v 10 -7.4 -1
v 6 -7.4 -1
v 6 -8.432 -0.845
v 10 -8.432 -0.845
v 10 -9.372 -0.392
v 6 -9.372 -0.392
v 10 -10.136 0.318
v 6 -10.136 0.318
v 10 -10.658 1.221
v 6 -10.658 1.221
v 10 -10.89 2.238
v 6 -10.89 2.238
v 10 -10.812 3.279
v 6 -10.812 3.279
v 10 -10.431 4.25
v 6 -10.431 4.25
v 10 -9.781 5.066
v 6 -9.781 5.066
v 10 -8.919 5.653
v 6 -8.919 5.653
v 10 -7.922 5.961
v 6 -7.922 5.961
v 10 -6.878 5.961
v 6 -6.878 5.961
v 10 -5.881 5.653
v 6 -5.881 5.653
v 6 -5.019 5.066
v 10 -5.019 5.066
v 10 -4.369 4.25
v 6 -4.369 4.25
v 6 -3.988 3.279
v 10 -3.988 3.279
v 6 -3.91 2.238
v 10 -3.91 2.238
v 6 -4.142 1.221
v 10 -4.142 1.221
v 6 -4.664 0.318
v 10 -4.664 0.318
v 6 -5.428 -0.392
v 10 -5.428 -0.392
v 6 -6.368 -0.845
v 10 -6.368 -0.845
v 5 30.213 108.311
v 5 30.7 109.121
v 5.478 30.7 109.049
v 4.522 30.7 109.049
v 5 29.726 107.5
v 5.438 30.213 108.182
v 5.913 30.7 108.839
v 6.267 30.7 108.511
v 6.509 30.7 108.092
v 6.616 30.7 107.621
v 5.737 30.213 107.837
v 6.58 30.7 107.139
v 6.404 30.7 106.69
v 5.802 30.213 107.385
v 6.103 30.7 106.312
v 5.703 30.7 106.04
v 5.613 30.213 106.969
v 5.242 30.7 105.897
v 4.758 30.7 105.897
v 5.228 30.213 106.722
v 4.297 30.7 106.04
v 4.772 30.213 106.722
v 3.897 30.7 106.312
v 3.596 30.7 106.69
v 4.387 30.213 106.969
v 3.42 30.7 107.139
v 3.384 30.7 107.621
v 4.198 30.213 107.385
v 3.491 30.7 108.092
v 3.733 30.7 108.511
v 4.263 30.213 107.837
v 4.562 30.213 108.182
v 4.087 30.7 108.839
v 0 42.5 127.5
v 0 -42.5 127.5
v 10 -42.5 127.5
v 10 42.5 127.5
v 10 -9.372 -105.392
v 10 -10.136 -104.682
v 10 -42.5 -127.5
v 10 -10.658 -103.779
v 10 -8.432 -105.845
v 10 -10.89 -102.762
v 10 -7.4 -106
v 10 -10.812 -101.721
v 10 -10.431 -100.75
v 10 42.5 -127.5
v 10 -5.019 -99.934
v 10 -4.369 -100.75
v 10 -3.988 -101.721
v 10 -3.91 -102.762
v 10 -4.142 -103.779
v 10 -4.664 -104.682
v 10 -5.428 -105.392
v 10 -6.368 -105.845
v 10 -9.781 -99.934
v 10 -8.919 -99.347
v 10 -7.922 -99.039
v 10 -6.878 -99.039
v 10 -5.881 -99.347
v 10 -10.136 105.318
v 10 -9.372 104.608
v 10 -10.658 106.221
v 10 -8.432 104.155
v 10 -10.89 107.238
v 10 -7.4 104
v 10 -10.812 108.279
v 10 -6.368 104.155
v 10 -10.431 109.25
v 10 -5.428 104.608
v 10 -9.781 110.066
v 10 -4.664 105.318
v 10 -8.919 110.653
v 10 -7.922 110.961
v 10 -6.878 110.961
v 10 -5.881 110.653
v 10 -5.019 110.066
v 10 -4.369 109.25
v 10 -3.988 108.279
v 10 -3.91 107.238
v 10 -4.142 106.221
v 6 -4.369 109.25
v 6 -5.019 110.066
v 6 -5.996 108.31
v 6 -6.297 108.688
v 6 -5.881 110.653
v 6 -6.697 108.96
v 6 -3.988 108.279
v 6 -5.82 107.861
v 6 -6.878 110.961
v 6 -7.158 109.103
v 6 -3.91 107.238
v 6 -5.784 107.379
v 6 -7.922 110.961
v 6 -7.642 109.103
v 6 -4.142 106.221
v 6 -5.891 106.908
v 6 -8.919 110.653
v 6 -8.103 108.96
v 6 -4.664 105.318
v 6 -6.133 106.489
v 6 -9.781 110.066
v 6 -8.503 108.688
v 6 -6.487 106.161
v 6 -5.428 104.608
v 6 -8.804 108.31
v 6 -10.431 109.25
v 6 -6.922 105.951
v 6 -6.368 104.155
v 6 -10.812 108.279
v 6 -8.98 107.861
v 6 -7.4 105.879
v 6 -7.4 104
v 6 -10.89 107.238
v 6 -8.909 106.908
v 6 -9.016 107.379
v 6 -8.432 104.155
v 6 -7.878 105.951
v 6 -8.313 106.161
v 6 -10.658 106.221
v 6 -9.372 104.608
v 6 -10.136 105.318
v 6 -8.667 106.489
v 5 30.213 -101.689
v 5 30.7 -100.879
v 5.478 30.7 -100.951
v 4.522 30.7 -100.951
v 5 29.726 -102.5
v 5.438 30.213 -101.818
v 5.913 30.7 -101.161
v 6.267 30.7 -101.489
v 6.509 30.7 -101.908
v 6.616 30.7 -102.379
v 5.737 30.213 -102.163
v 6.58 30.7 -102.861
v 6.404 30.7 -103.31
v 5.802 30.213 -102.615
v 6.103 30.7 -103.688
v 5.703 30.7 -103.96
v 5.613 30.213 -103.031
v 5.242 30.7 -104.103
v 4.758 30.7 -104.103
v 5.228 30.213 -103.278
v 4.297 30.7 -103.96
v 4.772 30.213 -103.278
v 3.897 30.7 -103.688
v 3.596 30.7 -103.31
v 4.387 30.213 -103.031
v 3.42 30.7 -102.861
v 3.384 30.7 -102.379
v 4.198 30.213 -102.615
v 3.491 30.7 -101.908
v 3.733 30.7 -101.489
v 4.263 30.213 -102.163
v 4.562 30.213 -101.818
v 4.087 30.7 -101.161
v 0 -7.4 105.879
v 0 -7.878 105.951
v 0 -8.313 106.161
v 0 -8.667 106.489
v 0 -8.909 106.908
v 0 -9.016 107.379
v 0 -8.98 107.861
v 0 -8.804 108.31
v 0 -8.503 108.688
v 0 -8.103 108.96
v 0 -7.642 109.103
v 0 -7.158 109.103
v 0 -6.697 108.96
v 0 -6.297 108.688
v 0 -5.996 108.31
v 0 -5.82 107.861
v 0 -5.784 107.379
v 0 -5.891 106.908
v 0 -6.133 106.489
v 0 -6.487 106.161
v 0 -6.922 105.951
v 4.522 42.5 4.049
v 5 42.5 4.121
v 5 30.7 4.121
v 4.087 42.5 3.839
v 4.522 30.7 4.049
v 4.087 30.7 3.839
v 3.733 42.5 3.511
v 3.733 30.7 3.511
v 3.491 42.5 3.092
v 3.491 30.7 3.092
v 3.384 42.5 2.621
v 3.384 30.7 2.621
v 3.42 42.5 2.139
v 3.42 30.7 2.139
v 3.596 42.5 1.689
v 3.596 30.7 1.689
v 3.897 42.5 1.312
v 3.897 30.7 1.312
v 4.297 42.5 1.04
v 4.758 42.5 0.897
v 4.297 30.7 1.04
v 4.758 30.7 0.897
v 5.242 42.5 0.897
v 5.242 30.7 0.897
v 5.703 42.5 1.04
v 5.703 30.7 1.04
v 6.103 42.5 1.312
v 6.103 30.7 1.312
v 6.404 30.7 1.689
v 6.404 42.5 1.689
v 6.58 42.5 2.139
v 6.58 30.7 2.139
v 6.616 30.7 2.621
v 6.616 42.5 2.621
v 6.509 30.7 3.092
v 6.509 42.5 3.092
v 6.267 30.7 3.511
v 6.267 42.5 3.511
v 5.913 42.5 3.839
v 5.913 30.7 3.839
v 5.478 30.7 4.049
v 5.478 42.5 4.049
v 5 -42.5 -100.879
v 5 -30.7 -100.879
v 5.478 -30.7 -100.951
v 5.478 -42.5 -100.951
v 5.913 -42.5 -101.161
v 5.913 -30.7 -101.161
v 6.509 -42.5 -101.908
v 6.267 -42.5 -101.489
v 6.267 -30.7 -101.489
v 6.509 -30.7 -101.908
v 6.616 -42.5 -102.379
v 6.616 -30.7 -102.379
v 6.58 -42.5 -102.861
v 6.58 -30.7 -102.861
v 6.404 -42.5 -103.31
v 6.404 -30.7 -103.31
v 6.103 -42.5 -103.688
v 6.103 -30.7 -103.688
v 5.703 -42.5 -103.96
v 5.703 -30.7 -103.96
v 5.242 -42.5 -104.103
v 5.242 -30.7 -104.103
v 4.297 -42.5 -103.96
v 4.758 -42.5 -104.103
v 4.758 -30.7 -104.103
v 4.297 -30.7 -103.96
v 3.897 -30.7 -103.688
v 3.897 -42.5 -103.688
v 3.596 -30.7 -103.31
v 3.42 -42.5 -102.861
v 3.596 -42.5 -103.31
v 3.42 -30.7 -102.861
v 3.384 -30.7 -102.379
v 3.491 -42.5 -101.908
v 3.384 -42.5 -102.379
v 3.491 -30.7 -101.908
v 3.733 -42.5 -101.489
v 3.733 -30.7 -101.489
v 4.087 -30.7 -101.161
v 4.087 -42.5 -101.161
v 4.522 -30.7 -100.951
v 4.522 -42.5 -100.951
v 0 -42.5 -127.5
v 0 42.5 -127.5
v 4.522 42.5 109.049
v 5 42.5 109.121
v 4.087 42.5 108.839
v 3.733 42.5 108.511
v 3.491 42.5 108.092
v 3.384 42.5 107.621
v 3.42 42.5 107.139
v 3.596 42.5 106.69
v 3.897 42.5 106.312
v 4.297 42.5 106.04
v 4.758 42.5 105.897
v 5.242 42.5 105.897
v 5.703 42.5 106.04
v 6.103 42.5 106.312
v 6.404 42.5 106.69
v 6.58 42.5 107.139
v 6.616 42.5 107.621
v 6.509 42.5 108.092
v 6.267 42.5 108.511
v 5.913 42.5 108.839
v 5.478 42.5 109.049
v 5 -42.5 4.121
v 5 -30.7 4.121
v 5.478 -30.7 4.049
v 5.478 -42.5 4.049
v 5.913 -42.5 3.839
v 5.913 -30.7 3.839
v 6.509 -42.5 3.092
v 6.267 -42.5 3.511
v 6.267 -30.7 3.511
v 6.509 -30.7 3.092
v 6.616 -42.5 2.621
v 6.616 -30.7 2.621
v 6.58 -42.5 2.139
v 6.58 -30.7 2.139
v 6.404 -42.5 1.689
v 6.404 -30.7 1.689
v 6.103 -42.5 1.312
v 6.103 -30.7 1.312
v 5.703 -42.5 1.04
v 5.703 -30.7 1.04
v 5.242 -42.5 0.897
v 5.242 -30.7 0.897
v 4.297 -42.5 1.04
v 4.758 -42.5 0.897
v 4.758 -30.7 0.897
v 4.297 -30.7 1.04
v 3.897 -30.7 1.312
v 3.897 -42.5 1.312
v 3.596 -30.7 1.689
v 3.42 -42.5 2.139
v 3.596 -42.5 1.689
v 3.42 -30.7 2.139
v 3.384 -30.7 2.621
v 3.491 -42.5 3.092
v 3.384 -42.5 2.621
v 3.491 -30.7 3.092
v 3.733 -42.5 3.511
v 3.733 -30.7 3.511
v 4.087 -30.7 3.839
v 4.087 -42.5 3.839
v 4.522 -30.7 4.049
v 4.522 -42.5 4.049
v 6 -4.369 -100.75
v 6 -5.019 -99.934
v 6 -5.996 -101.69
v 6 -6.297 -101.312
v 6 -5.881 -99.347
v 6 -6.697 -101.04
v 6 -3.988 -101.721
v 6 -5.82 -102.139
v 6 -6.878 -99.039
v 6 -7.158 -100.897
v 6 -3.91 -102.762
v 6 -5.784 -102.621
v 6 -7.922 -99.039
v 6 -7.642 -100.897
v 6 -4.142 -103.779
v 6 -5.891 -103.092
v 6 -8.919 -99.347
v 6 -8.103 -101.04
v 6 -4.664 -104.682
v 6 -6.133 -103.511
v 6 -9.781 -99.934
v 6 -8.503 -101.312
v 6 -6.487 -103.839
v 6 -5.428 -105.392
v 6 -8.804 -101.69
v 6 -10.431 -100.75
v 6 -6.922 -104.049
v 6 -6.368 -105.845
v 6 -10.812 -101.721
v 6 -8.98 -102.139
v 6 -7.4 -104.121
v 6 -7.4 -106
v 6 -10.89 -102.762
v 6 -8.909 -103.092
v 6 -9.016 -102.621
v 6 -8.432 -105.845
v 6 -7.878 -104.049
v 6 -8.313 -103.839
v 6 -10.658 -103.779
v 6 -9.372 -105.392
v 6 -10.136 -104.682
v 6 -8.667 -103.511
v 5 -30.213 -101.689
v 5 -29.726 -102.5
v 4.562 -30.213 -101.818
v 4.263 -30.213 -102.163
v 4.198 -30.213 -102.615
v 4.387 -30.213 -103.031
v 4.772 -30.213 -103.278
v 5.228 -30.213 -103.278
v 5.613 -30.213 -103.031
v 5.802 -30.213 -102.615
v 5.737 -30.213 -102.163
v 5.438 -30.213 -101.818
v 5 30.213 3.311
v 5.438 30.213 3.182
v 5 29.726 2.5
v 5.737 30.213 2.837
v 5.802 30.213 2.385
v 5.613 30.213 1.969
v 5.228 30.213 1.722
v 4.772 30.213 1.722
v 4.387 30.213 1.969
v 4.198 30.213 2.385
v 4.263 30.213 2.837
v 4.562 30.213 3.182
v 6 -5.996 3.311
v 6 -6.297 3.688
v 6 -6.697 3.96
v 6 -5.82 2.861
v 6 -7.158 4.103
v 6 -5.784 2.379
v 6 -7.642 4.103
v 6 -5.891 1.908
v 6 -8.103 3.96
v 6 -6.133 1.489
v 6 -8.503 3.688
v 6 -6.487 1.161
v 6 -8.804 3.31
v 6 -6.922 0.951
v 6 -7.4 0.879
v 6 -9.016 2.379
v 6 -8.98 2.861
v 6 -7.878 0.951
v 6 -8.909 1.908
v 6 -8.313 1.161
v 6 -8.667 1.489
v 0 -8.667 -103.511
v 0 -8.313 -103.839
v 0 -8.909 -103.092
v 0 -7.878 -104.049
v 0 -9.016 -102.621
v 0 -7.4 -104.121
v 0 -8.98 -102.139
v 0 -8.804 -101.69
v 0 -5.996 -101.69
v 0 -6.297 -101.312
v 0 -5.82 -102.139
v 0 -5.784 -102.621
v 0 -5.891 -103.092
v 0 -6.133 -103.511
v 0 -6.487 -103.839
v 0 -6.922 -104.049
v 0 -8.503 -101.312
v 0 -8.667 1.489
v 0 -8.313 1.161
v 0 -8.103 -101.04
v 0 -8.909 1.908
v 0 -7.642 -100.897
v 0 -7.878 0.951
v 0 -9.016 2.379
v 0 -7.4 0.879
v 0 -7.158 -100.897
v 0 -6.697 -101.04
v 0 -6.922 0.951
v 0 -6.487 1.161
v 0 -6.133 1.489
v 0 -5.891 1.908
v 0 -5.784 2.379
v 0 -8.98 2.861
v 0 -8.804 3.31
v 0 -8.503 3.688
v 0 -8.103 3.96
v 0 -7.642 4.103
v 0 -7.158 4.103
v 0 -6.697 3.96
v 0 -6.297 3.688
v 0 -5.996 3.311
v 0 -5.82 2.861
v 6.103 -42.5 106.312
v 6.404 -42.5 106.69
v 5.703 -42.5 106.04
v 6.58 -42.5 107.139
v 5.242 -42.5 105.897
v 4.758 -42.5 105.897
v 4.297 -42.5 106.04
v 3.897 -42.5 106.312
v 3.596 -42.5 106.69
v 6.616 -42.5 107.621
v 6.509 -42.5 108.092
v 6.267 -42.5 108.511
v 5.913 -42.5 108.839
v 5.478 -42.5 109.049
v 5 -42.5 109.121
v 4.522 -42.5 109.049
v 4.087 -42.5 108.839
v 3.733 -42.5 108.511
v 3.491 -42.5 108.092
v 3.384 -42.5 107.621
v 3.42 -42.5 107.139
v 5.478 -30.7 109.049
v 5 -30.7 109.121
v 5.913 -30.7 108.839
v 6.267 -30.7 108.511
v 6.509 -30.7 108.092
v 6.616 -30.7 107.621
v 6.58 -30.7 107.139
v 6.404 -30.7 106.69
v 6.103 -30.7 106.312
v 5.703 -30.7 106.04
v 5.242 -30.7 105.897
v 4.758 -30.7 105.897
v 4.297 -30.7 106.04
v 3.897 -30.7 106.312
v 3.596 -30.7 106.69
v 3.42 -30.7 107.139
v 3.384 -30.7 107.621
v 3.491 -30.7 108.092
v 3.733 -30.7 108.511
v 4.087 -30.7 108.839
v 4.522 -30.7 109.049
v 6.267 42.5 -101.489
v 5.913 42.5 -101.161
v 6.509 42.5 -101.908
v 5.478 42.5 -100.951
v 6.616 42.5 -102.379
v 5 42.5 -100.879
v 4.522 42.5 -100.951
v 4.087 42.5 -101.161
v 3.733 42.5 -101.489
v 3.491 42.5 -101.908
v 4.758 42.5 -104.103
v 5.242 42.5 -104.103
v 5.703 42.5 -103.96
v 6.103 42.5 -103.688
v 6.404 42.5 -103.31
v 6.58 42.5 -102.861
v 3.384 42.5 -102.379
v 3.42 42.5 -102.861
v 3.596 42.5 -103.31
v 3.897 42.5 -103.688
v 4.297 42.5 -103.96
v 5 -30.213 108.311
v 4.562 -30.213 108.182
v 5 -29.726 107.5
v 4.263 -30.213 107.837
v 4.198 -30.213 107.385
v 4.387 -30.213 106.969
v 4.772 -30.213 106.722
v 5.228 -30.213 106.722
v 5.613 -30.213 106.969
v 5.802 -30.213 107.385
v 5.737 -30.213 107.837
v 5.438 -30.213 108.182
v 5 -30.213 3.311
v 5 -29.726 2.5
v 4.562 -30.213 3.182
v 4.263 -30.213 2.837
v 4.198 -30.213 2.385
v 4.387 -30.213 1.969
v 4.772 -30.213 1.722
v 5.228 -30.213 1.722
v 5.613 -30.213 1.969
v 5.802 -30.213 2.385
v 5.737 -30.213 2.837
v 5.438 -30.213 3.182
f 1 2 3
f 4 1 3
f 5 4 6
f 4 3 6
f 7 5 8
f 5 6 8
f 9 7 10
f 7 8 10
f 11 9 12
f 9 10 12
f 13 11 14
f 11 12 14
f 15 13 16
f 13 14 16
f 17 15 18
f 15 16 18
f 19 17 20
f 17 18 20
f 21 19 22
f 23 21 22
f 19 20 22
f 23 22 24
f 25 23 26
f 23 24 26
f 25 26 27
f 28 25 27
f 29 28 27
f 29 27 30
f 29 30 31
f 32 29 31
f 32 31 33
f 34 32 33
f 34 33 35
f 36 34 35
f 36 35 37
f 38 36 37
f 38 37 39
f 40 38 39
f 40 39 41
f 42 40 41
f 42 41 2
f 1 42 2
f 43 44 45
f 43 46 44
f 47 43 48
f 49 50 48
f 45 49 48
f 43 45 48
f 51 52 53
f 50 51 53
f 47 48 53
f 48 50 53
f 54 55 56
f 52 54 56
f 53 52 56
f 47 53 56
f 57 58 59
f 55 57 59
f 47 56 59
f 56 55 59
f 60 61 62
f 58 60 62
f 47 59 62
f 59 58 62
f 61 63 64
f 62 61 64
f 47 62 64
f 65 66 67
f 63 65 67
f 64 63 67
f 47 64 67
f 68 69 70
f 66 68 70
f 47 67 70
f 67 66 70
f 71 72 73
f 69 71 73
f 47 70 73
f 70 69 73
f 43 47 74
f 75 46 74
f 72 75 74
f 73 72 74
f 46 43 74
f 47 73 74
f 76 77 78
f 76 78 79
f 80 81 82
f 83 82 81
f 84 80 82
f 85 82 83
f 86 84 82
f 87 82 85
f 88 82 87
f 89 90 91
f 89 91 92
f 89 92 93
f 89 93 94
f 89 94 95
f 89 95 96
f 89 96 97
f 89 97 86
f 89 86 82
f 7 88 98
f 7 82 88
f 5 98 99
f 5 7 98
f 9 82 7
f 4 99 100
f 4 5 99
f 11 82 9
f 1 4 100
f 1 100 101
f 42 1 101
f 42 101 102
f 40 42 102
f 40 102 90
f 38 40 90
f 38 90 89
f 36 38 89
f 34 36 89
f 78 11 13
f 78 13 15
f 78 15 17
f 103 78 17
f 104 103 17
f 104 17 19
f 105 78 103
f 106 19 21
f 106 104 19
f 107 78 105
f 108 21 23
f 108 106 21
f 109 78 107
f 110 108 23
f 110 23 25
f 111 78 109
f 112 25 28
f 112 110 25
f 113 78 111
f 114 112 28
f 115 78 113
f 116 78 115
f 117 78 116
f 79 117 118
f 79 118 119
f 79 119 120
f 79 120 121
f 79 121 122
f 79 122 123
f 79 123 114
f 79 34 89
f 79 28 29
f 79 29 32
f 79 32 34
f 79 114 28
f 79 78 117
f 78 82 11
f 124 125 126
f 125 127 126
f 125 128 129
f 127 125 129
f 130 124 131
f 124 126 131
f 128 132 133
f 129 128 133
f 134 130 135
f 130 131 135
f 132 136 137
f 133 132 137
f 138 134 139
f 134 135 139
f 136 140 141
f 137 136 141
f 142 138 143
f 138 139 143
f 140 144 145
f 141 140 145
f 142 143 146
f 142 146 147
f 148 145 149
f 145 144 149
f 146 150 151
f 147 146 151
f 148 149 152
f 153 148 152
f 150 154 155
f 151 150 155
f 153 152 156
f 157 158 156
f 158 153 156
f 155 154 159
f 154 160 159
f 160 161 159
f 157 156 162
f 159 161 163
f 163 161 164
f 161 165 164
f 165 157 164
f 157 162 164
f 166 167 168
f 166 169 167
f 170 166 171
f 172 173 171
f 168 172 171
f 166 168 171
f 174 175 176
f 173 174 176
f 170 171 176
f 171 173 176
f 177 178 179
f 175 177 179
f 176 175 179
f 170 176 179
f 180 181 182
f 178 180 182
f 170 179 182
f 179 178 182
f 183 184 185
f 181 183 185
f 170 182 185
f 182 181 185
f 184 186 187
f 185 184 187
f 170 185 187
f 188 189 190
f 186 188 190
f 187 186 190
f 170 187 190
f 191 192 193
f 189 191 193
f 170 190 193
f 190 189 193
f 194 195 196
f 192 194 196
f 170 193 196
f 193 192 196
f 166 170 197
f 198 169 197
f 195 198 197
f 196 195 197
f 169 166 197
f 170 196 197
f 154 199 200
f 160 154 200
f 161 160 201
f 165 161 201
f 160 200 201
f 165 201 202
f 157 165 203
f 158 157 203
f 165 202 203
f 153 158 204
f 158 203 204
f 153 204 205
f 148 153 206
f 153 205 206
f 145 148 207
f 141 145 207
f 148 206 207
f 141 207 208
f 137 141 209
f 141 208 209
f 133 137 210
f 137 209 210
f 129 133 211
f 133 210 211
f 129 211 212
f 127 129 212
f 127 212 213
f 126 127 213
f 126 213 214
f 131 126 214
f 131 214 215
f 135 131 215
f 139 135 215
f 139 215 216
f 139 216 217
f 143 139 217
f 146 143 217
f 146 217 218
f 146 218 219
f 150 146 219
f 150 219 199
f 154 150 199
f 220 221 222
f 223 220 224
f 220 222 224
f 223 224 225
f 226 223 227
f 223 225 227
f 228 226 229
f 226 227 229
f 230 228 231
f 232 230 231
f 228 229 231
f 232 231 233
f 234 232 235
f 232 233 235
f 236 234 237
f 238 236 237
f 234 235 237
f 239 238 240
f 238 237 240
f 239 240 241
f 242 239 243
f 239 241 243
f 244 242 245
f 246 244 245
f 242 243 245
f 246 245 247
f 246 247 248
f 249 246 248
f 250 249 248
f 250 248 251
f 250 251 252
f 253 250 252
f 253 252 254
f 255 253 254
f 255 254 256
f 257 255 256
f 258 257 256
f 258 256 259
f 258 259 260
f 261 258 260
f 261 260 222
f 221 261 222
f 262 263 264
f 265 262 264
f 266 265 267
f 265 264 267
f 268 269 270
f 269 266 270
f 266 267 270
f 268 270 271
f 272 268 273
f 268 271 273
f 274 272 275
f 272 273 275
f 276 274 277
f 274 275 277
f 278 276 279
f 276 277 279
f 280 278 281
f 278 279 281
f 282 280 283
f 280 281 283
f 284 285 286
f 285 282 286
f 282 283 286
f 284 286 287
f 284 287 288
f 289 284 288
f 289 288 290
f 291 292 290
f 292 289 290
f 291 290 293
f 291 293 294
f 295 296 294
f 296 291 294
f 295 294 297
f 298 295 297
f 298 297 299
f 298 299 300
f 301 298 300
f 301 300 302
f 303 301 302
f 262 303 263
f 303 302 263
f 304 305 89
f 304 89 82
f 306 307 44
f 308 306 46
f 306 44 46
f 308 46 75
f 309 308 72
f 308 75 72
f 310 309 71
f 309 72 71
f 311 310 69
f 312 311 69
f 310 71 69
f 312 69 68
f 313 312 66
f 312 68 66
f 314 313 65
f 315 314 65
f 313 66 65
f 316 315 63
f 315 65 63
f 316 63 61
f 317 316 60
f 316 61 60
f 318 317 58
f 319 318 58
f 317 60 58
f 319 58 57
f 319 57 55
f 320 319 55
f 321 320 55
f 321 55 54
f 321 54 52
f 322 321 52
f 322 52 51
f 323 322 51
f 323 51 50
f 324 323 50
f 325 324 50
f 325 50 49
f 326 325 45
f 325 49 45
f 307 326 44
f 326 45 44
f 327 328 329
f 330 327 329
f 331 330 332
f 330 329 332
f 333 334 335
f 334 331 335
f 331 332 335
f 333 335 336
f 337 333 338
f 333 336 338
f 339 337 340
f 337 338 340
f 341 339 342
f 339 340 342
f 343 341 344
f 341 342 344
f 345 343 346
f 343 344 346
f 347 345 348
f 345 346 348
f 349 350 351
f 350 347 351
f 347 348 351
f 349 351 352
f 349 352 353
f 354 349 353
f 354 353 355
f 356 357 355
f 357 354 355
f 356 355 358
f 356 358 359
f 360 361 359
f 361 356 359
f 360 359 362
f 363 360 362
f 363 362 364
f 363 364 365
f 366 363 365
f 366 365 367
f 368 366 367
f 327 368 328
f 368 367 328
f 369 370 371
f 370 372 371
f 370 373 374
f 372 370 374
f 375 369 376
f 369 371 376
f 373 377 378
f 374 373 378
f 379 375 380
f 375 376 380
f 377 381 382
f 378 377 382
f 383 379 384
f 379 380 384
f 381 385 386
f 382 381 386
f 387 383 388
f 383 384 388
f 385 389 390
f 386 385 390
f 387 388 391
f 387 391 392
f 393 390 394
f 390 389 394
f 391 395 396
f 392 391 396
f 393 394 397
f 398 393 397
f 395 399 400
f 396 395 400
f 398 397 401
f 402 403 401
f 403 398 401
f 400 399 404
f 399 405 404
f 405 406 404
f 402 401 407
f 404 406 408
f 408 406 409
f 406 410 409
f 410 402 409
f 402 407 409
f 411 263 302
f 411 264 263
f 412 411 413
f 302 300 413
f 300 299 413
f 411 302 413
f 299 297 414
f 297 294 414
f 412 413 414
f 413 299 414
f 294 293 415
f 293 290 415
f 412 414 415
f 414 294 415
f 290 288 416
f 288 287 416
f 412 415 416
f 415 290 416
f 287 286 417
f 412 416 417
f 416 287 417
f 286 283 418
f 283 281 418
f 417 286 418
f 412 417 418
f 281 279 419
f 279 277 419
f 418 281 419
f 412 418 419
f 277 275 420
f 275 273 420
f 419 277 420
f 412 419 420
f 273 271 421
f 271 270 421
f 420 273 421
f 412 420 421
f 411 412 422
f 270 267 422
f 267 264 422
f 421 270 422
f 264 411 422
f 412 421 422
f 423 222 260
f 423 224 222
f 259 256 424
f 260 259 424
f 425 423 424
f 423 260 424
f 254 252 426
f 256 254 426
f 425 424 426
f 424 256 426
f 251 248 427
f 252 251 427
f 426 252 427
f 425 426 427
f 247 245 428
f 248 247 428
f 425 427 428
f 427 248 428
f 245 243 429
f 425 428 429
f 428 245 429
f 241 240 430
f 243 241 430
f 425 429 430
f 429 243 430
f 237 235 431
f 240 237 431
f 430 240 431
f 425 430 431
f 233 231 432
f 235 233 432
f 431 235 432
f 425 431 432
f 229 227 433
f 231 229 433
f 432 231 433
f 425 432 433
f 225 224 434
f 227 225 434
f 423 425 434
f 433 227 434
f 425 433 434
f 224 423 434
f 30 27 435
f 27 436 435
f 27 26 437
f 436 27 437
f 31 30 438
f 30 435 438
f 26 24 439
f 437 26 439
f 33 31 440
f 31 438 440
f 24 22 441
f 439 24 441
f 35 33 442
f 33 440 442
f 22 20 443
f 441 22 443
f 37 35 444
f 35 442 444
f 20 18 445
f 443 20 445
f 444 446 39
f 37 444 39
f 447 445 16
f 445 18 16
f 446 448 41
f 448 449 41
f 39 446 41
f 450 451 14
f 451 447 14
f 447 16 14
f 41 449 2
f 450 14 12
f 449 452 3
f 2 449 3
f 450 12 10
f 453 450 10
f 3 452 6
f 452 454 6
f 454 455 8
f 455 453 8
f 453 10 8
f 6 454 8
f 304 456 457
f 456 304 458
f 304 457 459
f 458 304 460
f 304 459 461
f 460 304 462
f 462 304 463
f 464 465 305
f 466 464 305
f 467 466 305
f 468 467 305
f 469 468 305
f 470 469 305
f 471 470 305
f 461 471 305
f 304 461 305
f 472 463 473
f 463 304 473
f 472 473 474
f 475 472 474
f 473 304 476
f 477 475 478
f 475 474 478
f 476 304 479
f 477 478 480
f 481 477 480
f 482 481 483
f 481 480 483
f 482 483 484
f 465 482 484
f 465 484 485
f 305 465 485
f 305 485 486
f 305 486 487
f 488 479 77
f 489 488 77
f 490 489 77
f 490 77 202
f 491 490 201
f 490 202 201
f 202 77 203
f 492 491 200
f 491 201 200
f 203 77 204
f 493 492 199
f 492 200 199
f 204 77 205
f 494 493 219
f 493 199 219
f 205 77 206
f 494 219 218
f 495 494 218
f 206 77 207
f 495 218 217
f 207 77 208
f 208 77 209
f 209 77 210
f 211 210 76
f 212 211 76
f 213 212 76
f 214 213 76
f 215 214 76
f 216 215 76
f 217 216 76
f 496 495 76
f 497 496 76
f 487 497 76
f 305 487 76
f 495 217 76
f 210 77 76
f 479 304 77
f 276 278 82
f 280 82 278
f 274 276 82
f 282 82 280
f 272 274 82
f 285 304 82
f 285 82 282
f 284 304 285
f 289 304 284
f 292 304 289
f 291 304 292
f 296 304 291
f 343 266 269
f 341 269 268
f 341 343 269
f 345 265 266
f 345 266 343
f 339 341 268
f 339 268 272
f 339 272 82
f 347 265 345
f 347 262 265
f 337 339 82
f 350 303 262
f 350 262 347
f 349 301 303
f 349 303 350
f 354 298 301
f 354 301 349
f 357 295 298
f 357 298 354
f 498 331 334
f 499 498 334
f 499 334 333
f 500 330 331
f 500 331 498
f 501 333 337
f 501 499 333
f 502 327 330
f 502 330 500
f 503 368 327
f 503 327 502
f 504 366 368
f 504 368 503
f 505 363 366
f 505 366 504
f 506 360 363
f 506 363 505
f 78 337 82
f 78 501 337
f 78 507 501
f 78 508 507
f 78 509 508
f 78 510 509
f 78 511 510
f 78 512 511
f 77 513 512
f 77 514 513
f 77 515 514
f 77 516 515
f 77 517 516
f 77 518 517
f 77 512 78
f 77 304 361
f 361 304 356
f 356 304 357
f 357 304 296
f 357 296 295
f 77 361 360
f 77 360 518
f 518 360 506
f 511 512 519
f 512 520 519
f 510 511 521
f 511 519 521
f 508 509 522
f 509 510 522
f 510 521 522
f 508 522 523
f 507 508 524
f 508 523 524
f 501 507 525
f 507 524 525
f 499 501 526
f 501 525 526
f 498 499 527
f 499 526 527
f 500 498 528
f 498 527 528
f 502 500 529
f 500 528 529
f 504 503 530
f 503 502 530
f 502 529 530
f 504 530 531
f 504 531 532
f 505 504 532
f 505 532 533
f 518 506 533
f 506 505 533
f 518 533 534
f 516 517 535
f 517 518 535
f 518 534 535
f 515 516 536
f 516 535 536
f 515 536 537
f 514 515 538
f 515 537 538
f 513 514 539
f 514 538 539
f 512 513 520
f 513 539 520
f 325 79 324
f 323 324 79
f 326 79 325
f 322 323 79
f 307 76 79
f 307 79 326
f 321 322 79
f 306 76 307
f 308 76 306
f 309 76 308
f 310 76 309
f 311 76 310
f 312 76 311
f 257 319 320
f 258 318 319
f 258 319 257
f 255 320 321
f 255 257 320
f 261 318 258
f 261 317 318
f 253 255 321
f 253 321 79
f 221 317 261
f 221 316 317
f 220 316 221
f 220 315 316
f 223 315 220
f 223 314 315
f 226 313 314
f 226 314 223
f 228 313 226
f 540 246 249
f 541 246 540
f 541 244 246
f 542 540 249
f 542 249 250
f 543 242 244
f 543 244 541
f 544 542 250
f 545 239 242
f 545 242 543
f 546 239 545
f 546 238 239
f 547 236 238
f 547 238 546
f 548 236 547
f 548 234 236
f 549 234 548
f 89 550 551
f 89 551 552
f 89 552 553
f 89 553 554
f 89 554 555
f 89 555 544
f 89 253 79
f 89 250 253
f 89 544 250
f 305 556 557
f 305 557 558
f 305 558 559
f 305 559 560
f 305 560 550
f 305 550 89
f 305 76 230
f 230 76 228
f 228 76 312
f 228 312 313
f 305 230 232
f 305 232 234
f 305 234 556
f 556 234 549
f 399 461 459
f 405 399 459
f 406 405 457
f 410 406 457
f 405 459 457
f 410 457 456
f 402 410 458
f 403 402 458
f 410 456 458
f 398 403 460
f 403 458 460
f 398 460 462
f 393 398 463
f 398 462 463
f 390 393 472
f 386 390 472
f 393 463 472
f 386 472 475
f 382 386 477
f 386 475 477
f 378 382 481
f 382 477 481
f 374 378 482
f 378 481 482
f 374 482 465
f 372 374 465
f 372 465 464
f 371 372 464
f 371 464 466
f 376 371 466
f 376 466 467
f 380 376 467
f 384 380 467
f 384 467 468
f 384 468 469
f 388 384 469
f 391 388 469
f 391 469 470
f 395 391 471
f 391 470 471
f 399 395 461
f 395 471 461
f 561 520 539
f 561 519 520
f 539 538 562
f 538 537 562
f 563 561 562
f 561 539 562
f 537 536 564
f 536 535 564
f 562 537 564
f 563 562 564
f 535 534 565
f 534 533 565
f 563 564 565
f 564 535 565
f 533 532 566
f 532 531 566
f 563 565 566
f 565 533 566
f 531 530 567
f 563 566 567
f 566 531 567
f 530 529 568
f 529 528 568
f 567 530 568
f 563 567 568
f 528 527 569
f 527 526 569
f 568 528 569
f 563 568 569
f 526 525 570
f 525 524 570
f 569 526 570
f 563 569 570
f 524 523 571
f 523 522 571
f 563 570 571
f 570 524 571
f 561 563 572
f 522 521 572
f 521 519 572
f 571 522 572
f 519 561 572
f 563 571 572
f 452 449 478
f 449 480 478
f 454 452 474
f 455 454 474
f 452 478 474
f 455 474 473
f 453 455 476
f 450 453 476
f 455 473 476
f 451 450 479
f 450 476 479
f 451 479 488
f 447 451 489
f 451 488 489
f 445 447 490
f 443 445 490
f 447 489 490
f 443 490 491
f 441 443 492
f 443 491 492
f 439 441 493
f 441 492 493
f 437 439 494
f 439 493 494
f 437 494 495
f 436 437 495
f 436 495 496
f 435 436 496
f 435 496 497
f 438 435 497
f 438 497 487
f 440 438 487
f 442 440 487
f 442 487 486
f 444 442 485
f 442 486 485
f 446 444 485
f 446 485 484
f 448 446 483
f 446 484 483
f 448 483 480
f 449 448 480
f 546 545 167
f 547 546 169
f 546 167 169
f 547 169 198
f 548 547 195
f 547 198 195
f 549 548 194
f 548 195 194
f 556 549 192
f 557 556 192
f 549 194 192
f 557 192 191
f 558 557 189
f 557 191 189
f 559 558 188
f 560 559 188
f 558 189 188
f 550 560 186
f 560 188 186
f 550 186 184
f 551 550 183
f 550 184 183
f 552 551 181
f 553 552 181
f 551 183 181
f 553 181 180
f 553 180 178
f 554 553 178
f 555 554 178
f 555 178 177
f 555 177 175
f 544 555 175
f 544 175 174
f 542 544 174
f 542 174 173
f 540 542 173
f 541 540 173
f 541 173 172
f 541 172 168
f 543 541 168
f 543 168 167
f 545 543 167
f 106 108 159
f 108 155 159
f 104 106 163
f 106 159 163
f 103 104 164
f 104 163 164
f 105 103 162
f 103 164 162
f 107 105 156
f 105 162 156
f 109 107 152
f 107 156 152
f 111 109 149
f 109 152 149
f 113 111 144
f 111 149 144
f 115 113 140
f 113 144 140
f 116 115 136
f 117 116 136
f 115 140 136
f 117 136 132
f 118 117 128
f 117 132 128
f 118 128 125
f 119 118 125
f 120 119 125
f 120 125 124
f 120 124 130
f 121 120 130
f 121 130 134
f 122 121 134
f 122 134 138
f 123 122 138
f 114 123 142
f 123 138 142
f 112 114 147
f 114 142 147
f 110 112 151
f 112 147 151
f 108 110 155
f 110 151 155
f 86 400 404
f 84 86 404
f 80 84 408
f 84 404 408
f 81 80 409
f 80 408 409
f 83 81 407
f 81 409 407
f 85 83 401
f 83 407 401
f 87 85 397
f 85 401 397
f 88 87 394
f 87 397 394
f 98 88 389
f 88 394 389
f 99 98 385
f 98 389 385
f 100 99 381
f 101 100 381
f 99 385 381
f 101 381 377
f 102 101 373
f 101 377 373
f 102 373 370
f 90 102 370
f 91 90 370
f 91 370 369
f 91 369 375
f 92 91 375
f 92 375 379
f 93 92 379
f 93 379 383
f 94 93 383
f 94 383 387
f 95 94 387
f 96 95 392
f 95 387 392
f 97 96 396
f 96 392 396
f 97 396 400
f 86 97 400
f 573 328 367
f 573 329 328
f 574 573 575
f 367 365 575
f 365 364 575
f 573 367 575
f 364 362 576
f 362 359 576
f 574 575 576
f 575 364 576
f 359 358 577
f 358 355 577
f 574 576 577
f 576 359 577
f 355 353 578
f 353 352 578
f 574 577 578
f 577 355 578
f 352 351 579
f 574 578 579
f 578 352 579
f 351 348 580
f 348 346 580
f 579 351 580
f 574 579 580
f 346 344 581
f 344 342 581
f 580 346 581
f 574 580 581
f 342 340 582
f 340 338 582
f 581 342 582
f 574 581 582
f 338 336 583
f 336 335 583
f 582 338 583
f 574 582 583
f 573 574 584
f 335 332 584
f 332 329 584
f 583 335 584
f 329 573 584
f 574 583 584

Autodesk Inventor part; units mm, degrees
ref_plane "YZ Plane" through (0, 0, 0) normal (1, 0, 0) x (0, 1, 0)
ref_plane "XZ Plane" through (0, 0, 0) normal (0, 1, 0) x (-1, 0, 0)
ref_plane "XY Plane" through (0, 0, 0) normal (0, 0, 1) x (1, 0, 0)
sketch "Skizze1" plane through (0, 0, 0) normal (1, 0, 0) x (0, 1, 0)
  line L0 (-42.5, 127.5) -> (42.5, 127.5)
  line L1 (42.5, 127.5) -> (42.5, -127.5)
  line L2 (42.5, -127.5) -> (-42.5, -127.5)
  line L3 (-42.5, -127.5) -> (-42.5, 127.5)
  line L4 (-42.5, 127.5) -> (42.5, -127.5) construction
  line L5 (42.5, 127.5) -> (-42.5, -127.5) construction
  point P0 (0, 0)
  dimension "d0" = 85
  dimension "d1" = 255
extrude "Extrusion1" add sketch "Skizze1" along normal blind 10
sketch "Skizze2" plane through (10, 0, 0) normal (1, 0, 0) x (0, 0, -1)
  line L0 (-127.5, 42.5) -> (-127.5, -42.5) projected
  line L1 (127.5, -42.5) -> (127.5, 42.5) projected
  line L2 (127.5, 42.5) -> (-127.5, 42.5) projected
  point P0 (0, 0)
  point P1 (-107.5, -7.4)
  point P2 (-2.5, -7.4)
  point P3 (102.5, -7.4)
  dimension "d4" = 20
  dimension "d5" = 25
  dimension "d6" = 105
  dimension "d7" = 49.9
  dimension "d8" = 49.9
  dimension "d9" = 49.9
hole "Bohrung1" at (10, -7.4, 107.5) at (10, -7.4, 2.5) at (10, -7.4, -102.5) direction (-1, 0, 0) diameter 3.242 end through all counterbore diameter 7 counterbore depth 4 thread size "M4x0.7" class "6H" standard "ISO Metric profile"
sketch "Skizze3" plane through (0, 42.5, 127.5) normal (0, 1, 0) x (1, 0, 0)
  line L0 (0, 0) -> (10, 0) projected
  line L1 (5, 0) -> (5, 250)
  line L2 (0, 255) -> (10, 255) projected
  point P0 (0, 127.5)
  point P1 (5, 20)
  point P2 (5, 125)
  point P3 (5, 230)
  point P4 (5, 255)
  dimension "d17" = 20
  dimension "d18" = 25
  dimension "d19" = 105
hole "Bohrung2" at (5, 42.5, 107.5) at (5, 42.5, 2.5) at (5, 42.5, -102.5) direction (0, -1, 0) diameter 3.242 depth 11.8 tip angle 118 thread size "M4x0.7" class "6H" standard "ISO Metric profile"
mirror "Spiegeln1" about plane through (0, 0, 0) normal (0, 1, 0) of "Bohrung2"
equation "\"d8\" = d7"
equation "\"d9\" = d7"
properties part number "ER_Wand_1"
